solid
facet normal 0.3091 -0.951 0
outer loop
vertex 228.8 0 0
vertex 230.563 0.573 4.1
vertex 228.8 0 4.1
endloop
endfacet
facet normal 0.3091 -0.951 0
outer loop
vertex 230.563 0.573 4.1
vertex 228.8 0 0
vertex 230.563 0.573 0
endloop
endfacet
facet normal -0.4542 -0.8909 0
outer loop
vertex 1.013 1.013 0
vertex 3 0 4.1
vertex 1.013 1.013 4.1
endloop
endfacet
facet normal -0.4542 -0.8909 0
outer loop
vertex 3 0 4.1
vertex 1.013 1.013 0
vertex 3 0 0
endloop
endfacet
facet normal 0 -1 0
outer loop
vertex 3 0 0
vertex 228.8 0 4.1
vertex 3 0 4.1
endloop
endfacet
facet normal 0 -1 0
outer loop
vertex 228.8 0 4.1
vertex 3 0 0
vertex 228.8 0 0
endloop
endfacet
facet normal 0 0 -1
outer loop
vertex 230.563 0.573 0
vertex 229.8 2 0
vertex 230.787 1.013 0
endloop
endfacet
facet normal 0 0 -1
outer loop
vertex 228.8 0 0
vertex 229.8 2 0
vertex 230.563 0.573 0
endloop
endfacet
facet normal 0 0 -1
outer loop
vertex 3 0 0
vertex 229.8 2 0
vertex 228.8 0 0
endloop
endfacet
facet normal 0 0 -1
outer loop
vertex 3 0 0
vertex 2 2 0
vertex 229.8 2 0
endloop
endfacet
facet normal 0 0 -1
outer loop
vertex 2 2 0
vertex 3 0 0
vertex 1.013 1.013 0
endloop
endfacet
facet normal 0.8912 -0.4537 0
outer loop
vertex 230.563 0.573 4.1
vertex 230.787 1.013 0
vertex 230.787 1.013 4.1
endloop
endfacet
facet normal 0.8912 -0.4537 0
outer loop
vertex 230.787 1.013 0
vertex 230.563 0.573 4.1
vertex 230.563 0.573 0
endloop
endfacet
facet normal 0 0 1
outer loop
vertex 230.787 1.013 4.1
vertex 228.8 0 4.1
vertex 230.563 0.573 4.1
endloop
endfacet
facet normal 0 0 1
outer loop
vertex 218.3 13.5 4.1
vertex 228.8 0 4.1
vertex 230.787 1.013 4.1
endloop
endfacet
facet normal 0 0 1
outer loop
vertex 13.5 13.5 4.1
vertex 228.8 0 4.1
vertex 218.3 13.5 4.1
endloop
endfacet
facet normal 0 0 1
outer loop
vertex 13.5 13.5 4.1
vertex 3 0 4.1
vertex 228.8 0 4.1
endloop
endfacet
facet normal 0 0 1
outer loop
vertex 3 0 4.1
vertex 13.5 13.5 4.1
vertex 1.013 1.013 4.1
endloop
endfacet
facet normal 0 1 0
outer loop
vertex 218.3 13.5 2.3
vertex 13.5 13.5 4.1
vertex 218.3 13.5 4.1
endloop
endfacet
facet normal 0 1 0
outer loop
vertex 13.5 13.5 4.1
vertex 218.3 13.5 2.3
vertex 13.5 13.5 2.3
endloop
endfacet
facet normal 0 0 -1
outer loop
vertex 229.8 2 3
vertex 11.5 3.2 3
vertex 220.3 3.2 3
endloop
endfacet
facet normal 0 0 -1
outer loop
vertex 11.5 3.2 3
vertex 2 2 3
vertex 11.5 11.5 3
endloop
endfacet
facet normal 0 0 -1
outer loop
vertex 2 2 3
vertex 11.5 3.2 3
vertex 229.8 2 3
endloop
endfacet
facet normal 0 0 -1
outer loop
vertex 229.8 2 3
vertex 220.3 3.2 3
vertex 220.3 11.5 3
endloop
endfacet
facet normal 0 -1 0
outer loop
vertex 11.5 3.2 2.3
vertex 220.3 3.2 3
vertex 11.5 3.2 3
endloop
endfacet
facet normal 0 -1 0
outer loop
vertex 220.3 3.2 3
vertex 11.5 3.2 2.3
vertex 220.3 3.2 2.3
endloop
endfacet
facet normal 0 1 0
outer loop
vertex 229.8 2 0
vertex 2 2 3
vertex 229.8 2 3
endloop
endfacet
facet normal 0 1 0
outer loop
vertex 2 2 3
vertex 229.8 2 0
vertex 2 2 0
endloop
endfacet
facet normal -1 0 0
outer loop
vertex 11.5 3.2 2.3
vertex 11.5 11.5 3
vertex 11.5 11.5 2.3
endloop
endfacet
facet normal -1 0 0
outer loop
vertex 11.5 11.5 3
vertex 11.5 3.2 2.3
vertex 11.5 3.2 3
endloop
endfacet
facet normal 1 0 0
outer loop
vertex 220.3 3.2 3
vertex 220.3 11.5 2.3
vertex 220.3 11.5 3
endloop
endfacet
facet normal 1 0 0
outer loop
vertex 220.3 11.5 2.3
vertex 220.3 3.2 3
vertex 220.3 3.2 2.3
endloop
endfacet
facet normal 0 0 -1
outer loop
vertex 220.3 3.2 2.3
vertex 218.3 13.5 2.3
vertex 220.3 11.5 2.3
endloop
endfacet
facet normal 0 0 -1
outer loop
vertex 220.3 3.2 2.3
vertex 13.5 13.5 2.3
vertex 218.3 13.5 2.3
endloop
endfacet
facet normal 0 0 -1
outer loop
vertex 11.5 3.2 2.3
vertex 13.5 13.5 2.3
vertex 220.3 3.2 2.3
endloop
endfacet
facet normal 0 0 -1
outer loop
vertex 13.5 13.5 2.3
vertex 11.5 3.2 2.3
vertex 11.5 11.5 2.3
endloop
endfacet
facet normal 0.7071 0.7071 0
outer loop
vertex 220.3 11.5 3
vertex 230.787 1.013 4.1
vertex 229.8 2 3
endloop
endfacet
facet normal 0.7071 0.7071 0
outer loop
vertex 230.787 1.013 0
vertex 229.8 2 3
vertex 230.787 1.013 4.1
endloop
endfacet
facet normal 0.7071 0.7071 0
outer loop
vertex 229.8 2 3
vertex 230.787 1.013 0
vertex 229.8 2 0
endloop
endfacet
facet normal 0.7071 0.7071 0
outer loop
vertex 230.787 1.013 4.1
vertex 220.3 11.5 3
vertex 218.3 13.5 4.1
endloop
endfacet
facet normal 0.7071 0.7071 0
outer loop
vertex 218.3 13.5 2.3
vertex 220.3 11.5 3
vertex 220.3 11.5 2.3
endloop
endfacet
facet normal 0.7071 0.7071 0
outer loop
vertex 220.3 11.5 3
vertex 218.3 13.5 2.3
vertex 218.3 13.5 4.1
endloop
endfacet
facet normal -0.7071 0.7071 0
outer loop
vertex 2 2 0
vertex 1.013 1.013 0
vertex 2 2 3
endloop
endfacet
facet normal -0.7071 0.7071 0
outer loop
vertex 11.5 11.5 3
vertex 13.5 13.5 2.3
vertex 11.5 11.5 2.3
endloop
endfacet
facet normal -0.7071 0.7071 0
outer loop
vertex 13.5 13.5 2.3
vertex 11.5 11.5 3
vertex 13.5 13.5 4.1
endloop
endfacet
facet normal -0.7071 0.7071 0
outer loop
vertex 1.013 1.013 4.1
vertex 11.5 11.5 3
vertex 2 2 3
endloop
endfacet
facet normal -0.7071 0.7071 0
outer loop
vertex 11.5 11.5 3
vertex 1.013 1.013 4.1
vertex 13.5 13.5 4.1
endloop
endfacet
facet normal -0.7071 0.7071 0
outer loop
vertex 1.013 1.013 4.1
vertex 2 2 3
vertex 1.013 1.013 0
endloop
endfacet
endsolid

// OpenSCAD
// ============================================================
// Front Bezel - Bottom Side (mitered 45° corners)
// Bottom has large lip (10.3mm) over the display's 11.3mm
// inactive area, with narrow channel (1.2mm) for thin rim.
// Side channels at corners remain open for left/right rims.
// ============================================================
include <common.scad>

module bezel_bottom() {
    bezel_side("bottom");
}

bezel_bottom();
